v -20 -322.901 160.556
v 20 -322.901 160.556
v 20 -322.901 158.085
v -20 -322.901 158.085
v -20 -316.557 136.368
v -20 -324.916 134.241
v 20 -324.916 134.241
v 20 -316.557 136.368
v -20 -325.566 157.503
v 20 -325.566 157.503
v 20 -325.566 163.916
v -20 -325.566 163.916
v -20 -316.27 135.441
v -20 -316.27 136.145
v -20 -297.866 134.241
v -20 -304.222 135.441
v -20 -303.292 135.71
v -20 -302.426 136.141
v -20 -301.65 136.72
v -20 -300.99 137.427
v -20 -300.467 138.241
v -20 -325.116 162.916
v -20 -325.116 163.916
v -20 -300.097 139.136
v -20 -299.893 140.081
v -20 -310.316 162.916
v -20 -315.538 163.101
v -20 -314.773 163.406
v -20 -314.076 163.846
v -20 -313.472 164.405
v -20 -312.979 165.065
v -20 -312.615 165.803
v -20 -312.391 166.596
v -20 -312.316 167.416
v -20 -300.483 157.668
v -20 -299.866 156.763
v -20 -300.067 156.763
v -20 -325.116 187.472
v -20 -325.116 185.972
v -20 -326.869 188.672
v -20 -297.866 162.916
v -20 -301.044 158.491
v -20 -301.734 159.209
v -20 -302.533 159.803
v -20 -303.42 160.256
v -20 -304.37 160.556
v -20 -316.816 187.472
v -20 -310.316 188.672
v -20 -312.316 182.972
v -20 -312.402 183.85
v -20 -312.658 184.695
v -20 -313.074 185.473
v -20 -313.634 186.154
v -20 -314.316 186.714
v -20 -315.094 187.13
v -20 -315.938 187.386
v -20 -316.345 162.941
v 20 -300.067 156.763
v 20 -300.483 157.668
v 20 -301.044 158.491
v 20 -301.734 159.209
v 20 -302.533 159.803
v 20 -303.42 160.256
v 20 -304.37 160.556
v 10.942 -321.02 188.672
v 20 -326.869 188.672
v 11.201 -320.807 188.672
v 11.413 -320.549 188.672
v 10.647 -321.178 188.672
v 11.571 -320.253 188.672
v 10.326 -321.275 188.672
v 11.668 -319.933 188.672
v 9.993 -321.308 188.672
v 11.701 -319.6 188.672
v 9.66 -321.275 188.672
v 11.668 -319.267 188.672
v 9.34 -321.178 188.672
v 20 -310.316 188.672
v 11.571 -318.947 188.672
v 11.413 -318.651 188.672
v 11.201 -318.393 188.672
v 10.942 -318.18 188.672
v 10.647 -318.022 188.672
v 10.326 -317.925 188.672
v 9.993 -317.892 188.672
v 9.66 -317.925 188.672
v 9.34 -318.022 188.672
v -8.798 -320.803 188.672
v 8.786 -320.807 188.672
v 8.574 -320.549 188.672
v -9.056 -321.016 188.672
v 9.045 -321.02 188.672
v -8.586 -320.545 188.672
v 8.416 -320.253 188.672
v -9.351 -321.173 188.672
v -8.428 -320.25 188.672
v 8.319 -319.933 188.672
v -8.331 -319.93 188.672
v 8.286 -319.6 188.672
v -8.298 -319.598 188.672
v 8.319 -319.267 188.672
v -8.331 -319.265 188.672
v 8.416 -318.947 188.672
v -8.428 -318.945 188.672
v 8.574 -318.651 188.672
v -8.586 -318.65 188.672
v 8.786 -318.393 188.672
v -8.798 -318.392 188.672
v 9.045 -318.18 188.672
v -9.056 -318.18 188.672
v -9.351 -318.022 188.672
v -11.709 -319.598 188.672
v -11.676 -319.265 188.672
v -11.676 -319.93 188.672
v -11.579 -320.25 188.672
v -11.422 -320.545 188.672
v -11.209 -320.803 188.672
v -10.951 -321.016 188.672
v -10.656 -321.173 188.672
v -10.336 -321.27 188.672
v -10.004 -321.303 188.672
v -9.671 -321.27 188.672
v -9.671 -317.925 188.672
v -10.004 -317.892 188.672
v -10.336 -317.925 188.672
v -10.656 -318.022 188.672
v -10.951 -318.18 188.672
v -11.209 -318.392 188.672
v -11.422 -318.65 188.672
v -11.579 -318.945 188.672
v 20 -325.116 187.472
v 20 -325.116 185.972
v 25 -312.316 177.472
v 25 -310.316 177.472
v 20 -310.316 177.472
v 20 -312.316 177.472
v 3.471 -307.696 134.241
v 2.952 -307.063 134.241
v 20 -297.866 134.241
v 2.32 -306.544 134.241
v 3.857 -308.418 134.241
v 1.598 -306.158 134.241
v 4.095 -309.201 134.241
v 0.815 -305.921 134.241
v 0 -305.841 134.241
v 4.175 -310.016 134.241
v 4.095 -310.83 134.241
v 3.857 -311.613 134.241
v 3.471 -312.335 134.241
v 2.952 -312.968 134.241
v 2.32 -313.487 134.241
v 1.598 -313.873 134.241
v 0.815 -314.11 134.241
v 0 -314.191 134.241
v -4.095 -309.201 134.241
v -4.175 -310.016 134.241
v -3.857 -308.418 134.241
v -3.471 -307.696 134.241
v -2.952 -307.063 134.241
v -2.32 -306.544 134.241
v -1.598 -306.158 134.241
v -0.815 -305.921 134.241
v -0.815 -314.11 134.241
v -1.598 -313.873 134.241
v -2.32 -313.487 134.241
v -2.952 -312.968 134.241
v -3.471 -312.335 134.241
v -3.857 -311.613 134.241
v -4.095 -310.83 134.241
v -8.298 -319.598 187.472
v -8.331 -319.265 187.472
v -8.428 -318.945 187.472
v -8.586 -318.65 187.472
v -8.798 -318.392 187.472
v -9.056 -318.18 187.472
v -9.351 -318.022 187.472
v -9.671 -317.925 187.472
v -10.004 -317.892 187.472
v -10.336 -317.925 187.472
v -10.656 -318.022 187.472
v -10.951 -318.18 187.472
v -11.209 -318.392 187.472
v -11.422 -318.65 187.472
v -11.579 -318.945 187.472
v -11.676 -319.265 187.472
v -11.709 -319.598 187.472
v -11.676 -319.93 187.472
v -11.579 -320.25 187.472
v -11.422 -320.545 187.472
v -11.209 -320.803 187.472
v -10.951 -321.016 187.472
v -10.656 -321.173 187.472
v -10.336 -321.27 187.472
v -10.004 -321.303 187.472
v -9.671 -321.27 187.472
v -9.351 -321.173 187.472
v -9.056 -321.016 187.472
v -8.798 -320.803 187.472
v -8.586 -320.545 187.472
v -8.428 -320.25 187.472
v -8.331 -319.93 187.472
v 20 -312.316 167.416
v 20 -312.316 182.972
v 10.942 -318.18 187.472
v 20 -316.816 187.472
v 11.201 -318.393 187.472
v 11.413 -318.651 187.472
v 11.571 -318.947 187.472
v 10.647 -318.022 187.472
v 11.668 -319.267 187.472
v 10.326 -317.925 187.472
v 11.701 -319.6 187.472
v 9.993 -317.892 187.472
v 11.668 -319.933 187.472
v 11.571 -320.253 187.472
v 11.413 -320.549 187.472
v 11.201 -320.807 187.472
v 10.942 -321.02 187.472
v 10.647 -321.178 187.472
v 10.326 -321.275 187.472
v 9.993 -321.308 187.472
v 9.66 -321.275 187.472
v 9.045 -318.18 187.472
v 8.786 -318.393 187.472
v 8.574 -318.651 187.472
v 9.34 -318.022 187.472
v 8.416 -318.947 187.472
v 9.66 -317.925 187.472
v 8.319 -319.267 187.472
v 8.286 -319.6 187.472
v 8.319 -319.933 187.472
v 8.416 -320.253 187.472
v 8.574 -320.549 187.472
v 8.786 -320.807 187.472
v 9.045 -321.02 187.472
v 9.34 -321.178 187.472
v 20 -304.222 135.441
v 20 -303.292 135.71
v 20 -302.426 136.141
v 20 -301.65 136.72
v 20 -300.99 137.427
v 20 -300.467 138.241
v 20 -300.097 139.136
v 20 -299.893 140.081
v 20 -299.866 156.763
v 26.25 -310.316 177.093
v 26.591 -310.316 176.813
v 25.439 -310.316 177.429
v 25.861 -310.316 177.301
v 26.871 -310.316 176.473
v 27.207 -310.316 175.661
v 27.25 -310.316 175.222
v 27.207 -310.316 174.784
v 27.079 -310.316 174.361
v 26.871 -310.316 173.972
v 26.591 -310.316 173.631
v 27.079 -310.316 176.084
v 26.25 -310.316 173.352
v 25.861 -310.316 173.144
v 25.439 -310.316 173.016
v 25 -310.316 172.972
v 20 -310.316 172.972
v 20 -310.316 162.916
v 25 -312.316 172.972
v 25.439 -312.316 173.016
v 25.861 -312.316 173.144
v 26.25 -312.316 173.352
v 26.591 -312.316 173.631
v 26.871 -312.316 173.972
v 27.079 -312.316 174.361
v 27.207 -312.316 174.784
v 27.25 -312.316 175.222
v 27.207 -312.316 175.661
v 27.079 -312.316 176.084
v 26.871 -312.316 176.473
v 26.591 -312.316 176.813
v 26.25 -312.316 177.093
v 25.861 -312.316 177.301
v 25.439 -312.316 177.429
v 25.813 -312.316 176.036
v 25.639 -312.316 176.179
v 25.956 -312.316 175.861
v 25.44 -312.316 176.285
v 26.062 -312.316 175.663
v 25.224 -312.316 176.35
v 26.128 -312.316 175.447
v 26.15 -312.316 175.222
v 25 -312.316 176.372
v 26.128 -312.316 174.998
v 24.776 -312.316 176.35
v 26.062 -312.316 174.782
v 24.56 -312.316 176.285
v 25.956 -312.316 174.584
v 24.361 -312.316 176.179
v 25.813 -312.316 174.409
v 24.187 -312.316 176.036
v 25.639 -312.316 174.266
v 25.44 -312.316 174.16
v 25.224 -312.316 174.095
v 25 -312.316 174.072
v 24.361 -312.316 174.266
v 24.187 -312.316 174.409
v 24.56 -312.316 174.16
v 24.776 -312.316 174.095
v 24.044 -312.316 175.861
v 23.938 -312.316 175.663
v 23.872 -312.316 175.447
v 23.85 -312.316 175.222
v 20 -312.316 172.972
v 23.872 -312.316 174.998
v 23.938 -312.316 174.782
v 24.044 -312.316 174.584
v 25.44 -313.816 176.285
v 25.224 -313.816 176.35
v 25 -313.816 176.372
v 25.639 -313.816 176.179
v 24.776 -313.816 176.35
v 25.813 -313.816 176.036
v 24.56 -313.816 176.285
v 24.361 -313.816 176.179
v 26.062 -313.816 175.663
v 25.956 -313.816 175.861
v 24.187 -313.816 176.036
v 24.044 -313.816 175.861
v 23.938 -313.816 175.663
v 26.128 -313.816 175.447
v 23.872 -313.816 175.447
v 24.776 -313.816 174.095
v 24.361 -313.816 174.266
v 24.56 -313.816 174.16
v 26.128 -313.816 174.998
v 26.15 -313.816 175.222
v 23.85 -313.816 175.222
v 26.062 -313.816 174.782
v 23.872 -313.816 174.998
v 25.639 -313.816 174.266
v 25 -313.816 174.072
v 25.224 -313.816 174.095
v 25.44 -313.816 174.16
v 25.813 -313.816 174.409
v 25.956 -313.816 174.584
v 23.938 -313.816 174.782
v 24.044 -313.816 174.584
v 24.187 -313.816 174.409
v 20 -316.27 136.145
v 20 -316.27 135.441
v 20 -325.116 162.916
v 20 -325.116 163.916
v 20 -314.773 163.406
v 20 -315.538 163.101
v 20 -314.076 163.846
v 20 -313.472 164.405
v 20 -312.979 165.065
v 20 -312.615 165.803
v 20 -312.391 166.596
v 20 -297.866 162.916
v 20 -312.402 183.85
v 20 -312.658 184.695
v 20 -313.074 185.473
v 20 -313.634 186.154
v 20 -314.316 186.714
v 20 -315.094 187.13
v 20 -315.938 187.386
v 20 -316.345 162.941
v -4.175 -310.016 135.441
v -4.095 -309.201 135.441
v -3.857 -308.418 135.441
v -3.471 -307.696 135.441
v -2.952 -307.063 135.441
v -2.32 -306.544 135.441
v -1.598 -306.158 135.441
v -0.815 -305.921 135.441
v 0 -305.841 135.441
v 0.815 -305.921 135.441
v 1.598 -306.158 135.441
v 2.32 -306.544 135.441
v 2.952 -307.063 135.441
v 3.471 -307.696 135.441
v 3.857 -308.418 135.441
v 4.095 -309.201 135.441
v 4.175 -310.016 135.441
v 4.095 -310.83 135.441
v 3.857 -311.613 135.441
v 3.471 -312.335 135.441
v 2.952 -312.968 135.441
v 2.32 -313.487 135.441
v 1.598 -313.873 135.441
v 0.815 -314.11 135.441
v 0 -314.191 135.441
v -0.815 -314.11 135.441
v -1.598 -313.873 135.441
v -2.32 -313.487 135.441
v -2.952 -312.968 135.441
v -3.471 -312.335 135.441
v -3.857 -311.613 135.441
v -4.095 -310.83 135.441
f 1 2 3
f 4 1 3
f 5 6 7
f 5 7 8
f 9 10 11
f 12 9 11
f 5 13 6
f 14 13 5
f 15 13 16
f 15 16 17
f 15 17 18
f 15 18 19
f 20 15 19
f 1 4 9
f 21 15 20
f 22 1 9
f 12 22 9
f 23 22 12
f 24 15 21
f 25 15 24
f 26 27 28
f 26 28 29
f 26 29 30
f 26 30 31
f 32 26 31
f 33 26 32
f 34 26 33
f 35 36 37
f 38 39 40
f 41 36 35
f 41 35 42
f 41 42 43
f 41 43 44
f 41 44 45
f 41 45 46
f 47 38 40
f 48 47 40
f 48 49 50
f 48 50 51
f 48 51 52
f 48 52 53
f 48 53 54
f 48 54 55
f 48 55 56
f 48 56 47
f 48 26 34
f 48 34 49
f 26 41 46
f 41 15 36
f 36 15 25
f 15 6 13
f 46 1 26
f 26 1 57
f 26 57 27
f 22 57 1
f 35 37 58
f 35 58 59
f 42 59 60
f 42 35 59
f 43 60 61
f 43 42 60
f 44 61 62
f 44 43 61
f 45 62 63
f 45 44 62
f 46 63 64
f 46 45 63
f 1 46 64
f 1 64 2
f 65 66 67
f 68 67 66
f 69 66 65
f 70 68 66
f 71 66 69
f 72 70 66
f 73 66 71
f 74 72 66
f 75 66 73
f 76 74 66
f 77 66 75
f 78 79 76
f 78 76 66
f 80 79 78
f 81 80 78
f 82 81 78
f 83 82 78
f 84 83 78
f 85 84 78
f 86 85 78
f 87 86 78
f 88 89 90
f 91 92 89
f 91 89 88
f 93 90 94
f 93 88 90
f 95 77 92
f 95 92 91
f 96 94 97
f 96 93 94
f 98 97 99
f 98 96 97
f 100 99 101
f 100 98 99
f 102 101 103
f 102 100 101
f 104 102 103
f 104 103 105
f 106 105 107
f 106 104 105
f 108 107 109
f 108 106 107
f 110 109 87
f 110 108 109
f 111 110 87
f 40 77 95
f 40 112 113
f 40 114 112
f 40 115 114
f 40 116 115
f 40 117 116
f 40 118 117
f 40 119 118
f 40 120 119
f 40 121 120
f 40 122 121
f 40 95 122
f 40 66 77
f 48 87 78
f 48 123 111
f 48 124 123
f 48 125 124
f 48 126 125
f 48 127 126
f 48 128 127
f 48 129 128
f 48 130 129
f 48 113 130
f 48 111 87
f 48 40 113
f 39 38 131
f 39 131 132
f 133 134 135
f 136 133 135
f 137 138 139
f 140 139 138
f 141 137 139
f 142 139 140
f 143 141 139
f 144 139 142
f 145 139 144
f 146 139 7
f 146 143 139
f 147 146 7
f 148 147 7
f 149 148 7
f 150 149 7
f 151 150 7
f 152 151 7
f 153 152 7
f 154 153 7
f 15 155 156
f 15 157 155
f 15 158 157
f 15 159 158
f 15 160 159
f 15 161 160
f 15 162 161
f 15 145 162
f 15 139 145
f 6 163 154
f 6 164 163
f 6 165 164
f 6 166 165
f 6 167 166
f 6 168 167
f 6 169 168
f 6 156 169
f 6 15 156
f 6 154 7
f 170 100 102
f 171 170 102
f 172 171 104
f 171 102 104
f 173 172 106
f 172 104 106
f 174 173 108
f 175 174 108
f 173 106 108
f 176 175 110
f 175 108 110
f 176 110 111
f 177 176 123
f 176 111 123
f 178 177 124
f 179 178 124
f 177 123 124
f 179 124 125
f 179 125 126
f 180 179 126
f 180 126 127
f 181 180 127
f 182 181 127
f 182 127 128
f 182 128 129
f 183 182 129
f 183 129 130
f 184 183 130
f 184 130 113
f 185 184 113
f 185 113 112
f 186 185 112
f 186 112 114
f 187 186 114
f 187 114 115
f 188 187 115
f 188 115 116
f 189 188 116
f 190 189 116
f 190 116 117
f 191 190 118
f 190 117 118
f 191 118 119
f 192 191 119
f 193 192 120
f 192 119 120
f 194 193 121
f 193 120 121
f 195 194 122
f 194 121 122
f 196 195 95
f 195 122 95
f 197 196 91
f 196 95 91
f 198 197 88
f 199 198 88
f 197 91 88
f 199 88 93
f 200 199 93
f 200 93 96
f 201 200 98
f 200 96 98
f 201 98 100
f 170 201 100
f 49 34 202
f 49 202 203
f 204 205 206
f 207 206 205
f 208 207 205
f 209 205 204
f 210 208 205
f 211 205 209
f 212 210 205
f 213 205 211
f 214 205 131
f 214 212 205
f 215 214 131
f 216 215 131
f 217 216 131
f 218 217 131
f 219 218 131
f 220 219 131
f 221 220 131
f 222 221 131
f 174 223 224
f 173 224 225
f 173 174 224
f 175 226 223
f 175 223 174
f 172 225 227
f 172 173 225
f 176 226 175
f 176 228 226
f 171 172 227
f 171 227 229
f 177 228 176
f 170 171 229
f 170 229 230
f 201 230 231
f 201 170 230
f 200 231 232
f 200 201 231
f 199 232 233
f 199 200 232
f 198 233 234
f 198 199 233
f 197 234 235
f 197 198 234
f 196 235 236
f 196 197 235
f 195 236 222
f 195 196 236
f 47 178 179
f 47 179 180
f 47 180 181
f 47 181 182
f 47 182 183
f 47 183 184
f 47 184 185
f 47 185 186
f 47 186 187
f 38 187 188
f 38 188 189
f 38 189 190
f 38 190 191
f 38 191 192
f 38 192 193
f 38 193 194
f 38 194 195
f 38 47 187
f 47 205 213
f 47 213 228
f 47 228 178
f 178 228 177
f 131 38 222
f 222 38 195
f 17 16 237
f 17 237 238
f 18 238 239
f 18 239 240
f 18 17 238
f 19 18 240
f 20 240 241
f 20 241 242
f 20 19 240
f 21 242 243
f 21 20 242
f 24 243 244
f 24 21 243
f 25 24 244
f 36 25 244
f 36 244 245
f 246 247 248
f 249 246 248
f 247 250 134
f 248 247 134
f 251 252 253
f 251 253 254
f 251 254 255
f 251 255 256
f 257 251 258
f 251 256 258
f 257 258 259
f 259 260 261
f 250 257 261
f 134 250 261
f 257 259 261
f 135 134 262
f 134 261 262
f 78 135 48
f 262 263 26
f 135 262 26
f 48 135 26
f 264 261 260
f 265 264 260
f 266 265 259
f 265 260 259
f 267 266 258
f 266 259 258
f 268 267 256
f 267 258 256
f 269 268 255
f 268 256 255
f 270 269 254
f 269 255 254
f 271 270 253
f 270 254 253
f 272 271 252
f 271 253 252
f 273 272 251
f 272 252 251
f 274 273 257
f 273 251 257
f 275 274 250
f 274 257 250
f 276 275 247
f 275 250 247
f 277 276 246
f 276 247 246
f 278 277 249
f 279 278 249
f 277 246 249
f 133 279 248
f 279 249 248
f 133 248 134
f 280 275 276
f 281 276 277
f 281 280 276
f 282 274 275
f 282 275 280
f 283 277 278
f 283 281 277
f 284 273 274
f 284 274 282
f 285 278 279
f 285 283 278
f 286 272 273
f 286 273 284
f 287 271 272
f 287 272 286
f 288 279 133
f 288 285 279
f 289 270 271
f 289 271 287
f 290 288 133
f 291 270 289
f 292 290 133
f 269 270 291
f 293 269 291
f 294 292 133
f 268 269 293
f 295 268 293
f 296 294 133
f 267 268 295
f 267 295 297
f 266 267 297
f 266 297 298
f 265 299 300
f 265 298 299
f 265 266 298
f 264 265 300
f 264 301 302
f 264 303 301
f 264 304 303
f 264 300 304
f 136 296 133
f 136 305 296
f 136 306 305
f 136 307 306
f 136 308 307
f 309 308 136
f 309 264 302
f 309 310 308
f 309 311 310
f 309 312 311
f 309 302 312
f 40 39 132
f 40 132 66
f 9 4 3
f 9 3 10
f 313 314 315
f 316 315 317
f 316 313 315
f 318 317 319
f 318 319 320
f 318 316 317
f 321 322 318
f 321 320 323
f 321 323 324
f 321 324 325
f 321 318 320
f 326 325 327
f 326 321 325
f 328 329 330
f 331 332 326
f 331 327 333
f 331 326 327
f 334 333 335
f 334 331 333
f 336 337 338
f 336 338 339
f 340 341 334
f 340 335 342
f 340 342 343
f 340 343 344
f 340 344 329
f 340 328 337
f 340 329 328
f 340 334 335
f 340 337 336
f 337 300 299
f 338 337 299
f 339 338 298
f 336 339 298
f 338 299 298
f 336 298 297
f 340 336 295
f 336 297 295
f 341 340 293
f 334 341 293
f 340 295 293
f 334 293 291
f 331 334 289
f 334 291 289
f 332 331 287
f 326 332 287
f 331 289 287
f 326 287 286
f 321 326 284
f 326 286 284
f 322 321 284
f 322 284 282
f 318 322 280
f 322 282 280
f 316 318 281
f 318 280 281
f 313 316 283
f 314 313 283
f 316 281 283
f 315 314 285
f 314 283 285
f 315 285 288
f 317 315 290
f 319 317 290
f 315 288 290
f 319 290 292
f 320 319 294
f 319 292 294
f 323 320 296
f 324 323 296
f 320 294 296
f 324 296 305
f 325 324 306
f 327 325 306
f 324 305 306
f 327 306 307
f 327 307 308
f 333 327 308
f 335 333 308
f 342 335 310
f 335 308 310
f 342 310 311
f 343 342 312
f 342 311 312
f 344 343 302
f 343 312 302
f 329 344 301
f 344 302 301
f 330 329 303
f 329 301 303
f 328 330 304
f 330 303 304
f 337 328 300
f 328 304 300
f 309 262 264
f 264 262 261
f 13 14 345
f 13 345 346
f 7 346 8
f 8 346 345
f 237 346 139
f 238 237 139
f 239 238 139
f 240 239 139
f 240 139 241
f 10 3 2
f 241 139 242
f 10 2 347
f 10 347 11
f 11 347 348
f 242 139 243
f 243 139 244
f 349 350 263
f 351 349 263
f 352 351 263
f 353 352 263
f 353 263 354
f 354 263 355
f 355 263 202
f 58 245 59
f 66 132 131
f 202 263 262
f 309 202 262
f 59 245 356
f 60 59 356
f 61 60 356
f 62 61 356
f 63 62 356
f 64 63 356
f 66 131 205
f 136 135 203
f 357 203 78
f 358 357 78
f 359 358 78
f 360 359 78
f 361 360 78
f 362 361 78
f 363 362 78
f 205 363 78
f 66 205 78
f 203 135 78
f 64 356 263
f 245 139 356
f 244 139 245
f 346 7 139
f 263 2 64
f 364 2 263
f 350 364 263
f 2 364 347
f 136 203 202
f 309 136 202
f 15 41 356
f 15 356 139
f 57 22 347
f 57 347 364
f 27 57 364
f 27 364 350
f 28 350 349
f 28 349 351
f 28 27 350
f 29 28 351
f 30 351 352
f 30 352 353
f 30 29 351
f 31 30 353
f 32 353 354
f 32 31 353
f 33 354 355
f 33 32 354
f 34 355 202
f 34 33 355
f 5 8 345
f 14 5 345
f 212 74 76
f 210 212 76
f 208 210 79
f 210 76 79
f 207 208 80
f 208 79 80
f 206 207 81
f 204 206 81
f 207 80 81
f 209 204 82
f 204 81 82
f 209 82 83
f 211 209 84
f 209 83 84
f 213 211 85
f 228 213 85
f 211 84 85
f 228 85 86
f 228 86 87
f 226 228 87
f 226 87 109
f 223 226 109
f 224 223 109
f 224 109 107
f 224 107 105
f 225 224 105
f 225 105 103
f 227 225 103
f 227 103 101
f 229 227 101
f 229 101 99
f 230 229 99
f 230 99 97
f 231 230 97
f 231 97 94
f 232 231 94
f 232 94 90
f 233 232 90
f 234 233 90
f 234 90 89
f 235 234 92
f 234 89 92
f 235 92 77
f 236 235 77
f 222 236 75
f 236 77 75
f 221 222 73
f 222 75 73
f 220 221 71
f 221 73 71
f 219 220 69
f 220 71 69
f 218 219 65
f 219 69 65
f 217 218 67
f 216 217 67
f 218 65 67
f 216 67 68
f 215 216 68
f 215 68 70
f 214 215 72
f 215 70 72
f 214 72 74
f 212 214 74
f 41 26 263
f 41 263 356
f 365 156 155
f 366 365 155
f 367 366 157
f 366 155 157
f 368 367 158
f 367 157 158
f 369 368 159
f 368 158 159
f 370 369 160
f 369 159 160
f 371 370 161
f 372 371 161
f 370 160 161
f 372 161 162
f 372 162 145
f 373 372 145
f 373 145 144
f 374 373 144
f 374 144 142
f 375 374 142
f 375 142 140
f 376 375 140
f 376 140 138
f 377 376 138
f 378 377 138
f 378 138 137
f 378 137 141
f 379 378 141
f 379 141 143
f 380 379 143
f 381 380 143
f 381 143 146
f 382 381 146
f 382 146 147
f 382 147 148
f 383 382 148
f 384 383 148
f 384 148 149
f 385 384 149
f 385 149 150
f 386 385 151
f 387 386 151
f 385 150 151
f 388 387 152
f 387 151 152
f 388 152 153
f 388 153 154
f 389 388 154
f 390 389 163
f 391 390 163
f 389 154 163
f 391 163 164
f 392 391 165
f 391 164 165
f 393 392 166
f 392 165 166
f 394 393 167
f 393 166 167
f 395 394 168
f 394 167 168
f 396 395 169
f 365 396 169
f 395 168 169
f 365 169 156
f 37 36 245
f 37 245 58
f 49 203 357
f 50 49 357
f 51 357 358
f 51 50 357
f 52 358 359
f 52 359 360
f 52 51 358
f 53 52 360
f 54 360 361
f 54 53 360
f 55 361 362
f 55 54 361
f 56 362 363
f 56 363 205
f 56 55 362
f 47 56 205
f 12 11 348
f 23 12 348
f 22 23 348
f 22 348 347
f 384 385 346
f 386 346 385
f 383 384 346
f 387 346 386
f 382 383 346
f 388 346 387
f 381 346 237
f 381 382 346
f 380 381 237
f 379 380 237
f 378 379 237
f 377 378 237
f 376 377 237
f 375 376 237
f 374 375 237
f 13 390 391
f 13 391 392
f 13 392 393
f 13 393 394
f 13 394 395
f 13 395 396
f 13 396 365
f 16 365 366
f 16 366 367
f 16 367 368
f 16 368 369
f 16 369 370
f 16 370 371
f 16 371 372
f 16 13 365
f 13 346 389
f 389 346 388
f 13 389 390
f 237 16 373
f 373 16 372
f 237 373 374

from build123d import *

# Parameters (mm, degrees)
BOSS_EXTRUDE1_DEPTH      = 20
BOSS_EXTRUDE1_DEPTH_BACK = 20
BOSS_EXTRUDE2_DEPTH      = 2
SKETCH3_R                = 1.150002101
BOSS_EXTRUDE3_DEPTH      = 1.5
SKETCH4_R                = 4.175000755
CUT_EXTRUDE2_DEPTH       = 2
SKETCH5_R                = 1.705230735
SKETCH5_R_2              = 1.707530227
CUT_EXTRUDE4_DEPTH       = 2


with BuildPart() as part:
    # Sketch1 → Boss-Extrude1 (new, two sides: drawn at the far end of the back side and taken through both)
    with BuildSketch(Plane(origin=(0, 0, 0), x_dir=(0, 0, -1), z_dir=(1, 0, 0)).offset(-BOSS_EXTRUDE1_DEPTH_BACK)):
        with BuildLine():
            Line((-187.472492456, -316.815644503), (-187.472492456, -325.115650892))
            Line((-187.472492456, -325.115650892), (-185.972481966, -325.115650892))
            Line((-185.972481966, -325.115650892), (-188.672482967, -326.869040728))
            Line((-188.672482967, -326.869040728), (-188.672482967, -312.315642834))
            Line((-188.672482967, -312.315642834), (-188.672482967, -310.315638781))
            Line((-188.672482967, -310.315638781), (-162.915930152, -310.315638781))
            Line((-162.915930152, -310.315638781), (-162.915930152, -297.865658998))
            Line((-162.915930152, -297.865658998), (-134.240537882, -297.865658998))
            Line((-134.240537882, -297.865658998), (-134.240537882, -324.915647507))
            Line((-134.240537882, -324.915647507), (-136.367589235, -316.556811333))
            Line((-136.367589235, -316.556811333), (-136.14474237, -316.270142794))
            Line((-136.14474237, -316.270142794), (-135.440543294, -316.270142794))
            Line((-135.440543294, -316.270142794), (-135.440543294, -304.221749306))
            ThreePointArc((-135.440543294, -304.221749306), (-137.058677208, -301.304506823), (-140.081375837, -299.893140793))
            Line((-140.081375837, -299.893140793), (-156.763136387, -299.865663052))
            Line((-156.763136387, -299.865663052), (-156.763136387, -300.066769123))
            ThreePointArc((-156.763136387, -300.066769123), (-159.209325453, -301.733847579), (-160.555794835, -304.370135069))
            Line((-160.555794835, -304.370135069), (-160.555794835, -322.901427746))
            Line((-160.555794835, -322.901427746), (-158.084884286, -322.901427746))
            Line((-158.084884286, -322.901427746), (-157.503083348, -325.565636158))
            Line((-157.503083348, -325.565636158), (-162.915930152, -325.565636158))
            Line((-162.915930152, -325.565636158), (-163.915917277, -325.565636158))
            Line((-163.915917277, -325.565636158), (-163.915917277, -325.115650892))
            Line((-163.915917277, -325.115650892), (-162.915930152, -325.115650892))
            Line((-162.915930152, -325.115650892), (-162.940576673, -316.345274448))
            ThreePointArc((-162.940576673, -316.345274448), (-164.404833902, -313.471500259), (-167.41591692, -312.315642834))
            Line((-167.41591692, -312.315642834), (-182.972493545, -312.315642834))
            ThreePointArc((-182.972493545, -312.315642834), (-186.154473458, -313.633663782), (-187.472492456, -316.815644503))
        make_face()
    extrude(amount=BOSS_EXTRUDE1_DEPTH + BOSS_EXTRUDE1_DEPTH_BACK)

    # Sketch2 → Boss-Extrude2 (add)
    with BuildSketch(Plane(origin=(0, -310.315638781, 0), x_dir=(1, 0, 0), z_dir=(0, 1, 0))):
        with BuildLine():
            Line((19.999999553, -172.972485423), (25.000000373, -172.972485423))
            ThreePointArc((25.000000373, -172.972485423), (27.250001207, -175.222486258), (25.000000373, -177.472487092))
            Line((25.000000373, -177.472487092), (19.999999553, -177.472487092))
            Line((19.999999553, -177.472487092), (19.999999553, -172.972485423))
        make_face()
    extrude(amount=-BOSS_EXTRUDE2_DEPTH)


with BuildPart() as boss_extrude3_tool:
    # Sketch3 → Boss-Extrude3 (new body)
    with BuildSketch(Plane.XZ.offset(312.315642834)):
        with Locations((25.000001633, 175.222481271)):
            Circle(SKETCH3_R)
    extrude(amount=BOSS_EXTRUDE3_DEPTH)


with BuildPart() as part_1:
    add(part.part)


with BuildPart() as part_2:
    # Boss-Extrude3: joined with boss_extrude3_tool
    add(part_1.part.fuse(boss_extrude3_tool.part, tol=0.00001))

    # Sketch4 → Cut-Extrude2 (cut)
    with BuildSketch(Plane(origin=(0, 0, 134.240537882), x_dir=(-1, 0, 0), z_dir=(0, 0, -1))):
        with Locations((-3.97e-07, -310.01564175)):
            Circle(SKETCH4_R)
    extrude(amount=-CUT_EXTRUDE2_DEPTH, mode=Mode.SUBTRACT)

    # Sketch5 → Cut-Extrude4 (cut)
    with BuildSketch(Plane.XY.offset(188.672482967)):
        with Locations((-10.003669951, -319.597688846)):
            Circle(SKETCH5_R)
        with Locations((9.993329109, -319.599979292)):
            Circle(SKETCH5_R_2)
    extrude(amount=-CUT_EXTRUDE4_DEPTH, mode=Mode.SUBTRACT)


solid = part_2.part
